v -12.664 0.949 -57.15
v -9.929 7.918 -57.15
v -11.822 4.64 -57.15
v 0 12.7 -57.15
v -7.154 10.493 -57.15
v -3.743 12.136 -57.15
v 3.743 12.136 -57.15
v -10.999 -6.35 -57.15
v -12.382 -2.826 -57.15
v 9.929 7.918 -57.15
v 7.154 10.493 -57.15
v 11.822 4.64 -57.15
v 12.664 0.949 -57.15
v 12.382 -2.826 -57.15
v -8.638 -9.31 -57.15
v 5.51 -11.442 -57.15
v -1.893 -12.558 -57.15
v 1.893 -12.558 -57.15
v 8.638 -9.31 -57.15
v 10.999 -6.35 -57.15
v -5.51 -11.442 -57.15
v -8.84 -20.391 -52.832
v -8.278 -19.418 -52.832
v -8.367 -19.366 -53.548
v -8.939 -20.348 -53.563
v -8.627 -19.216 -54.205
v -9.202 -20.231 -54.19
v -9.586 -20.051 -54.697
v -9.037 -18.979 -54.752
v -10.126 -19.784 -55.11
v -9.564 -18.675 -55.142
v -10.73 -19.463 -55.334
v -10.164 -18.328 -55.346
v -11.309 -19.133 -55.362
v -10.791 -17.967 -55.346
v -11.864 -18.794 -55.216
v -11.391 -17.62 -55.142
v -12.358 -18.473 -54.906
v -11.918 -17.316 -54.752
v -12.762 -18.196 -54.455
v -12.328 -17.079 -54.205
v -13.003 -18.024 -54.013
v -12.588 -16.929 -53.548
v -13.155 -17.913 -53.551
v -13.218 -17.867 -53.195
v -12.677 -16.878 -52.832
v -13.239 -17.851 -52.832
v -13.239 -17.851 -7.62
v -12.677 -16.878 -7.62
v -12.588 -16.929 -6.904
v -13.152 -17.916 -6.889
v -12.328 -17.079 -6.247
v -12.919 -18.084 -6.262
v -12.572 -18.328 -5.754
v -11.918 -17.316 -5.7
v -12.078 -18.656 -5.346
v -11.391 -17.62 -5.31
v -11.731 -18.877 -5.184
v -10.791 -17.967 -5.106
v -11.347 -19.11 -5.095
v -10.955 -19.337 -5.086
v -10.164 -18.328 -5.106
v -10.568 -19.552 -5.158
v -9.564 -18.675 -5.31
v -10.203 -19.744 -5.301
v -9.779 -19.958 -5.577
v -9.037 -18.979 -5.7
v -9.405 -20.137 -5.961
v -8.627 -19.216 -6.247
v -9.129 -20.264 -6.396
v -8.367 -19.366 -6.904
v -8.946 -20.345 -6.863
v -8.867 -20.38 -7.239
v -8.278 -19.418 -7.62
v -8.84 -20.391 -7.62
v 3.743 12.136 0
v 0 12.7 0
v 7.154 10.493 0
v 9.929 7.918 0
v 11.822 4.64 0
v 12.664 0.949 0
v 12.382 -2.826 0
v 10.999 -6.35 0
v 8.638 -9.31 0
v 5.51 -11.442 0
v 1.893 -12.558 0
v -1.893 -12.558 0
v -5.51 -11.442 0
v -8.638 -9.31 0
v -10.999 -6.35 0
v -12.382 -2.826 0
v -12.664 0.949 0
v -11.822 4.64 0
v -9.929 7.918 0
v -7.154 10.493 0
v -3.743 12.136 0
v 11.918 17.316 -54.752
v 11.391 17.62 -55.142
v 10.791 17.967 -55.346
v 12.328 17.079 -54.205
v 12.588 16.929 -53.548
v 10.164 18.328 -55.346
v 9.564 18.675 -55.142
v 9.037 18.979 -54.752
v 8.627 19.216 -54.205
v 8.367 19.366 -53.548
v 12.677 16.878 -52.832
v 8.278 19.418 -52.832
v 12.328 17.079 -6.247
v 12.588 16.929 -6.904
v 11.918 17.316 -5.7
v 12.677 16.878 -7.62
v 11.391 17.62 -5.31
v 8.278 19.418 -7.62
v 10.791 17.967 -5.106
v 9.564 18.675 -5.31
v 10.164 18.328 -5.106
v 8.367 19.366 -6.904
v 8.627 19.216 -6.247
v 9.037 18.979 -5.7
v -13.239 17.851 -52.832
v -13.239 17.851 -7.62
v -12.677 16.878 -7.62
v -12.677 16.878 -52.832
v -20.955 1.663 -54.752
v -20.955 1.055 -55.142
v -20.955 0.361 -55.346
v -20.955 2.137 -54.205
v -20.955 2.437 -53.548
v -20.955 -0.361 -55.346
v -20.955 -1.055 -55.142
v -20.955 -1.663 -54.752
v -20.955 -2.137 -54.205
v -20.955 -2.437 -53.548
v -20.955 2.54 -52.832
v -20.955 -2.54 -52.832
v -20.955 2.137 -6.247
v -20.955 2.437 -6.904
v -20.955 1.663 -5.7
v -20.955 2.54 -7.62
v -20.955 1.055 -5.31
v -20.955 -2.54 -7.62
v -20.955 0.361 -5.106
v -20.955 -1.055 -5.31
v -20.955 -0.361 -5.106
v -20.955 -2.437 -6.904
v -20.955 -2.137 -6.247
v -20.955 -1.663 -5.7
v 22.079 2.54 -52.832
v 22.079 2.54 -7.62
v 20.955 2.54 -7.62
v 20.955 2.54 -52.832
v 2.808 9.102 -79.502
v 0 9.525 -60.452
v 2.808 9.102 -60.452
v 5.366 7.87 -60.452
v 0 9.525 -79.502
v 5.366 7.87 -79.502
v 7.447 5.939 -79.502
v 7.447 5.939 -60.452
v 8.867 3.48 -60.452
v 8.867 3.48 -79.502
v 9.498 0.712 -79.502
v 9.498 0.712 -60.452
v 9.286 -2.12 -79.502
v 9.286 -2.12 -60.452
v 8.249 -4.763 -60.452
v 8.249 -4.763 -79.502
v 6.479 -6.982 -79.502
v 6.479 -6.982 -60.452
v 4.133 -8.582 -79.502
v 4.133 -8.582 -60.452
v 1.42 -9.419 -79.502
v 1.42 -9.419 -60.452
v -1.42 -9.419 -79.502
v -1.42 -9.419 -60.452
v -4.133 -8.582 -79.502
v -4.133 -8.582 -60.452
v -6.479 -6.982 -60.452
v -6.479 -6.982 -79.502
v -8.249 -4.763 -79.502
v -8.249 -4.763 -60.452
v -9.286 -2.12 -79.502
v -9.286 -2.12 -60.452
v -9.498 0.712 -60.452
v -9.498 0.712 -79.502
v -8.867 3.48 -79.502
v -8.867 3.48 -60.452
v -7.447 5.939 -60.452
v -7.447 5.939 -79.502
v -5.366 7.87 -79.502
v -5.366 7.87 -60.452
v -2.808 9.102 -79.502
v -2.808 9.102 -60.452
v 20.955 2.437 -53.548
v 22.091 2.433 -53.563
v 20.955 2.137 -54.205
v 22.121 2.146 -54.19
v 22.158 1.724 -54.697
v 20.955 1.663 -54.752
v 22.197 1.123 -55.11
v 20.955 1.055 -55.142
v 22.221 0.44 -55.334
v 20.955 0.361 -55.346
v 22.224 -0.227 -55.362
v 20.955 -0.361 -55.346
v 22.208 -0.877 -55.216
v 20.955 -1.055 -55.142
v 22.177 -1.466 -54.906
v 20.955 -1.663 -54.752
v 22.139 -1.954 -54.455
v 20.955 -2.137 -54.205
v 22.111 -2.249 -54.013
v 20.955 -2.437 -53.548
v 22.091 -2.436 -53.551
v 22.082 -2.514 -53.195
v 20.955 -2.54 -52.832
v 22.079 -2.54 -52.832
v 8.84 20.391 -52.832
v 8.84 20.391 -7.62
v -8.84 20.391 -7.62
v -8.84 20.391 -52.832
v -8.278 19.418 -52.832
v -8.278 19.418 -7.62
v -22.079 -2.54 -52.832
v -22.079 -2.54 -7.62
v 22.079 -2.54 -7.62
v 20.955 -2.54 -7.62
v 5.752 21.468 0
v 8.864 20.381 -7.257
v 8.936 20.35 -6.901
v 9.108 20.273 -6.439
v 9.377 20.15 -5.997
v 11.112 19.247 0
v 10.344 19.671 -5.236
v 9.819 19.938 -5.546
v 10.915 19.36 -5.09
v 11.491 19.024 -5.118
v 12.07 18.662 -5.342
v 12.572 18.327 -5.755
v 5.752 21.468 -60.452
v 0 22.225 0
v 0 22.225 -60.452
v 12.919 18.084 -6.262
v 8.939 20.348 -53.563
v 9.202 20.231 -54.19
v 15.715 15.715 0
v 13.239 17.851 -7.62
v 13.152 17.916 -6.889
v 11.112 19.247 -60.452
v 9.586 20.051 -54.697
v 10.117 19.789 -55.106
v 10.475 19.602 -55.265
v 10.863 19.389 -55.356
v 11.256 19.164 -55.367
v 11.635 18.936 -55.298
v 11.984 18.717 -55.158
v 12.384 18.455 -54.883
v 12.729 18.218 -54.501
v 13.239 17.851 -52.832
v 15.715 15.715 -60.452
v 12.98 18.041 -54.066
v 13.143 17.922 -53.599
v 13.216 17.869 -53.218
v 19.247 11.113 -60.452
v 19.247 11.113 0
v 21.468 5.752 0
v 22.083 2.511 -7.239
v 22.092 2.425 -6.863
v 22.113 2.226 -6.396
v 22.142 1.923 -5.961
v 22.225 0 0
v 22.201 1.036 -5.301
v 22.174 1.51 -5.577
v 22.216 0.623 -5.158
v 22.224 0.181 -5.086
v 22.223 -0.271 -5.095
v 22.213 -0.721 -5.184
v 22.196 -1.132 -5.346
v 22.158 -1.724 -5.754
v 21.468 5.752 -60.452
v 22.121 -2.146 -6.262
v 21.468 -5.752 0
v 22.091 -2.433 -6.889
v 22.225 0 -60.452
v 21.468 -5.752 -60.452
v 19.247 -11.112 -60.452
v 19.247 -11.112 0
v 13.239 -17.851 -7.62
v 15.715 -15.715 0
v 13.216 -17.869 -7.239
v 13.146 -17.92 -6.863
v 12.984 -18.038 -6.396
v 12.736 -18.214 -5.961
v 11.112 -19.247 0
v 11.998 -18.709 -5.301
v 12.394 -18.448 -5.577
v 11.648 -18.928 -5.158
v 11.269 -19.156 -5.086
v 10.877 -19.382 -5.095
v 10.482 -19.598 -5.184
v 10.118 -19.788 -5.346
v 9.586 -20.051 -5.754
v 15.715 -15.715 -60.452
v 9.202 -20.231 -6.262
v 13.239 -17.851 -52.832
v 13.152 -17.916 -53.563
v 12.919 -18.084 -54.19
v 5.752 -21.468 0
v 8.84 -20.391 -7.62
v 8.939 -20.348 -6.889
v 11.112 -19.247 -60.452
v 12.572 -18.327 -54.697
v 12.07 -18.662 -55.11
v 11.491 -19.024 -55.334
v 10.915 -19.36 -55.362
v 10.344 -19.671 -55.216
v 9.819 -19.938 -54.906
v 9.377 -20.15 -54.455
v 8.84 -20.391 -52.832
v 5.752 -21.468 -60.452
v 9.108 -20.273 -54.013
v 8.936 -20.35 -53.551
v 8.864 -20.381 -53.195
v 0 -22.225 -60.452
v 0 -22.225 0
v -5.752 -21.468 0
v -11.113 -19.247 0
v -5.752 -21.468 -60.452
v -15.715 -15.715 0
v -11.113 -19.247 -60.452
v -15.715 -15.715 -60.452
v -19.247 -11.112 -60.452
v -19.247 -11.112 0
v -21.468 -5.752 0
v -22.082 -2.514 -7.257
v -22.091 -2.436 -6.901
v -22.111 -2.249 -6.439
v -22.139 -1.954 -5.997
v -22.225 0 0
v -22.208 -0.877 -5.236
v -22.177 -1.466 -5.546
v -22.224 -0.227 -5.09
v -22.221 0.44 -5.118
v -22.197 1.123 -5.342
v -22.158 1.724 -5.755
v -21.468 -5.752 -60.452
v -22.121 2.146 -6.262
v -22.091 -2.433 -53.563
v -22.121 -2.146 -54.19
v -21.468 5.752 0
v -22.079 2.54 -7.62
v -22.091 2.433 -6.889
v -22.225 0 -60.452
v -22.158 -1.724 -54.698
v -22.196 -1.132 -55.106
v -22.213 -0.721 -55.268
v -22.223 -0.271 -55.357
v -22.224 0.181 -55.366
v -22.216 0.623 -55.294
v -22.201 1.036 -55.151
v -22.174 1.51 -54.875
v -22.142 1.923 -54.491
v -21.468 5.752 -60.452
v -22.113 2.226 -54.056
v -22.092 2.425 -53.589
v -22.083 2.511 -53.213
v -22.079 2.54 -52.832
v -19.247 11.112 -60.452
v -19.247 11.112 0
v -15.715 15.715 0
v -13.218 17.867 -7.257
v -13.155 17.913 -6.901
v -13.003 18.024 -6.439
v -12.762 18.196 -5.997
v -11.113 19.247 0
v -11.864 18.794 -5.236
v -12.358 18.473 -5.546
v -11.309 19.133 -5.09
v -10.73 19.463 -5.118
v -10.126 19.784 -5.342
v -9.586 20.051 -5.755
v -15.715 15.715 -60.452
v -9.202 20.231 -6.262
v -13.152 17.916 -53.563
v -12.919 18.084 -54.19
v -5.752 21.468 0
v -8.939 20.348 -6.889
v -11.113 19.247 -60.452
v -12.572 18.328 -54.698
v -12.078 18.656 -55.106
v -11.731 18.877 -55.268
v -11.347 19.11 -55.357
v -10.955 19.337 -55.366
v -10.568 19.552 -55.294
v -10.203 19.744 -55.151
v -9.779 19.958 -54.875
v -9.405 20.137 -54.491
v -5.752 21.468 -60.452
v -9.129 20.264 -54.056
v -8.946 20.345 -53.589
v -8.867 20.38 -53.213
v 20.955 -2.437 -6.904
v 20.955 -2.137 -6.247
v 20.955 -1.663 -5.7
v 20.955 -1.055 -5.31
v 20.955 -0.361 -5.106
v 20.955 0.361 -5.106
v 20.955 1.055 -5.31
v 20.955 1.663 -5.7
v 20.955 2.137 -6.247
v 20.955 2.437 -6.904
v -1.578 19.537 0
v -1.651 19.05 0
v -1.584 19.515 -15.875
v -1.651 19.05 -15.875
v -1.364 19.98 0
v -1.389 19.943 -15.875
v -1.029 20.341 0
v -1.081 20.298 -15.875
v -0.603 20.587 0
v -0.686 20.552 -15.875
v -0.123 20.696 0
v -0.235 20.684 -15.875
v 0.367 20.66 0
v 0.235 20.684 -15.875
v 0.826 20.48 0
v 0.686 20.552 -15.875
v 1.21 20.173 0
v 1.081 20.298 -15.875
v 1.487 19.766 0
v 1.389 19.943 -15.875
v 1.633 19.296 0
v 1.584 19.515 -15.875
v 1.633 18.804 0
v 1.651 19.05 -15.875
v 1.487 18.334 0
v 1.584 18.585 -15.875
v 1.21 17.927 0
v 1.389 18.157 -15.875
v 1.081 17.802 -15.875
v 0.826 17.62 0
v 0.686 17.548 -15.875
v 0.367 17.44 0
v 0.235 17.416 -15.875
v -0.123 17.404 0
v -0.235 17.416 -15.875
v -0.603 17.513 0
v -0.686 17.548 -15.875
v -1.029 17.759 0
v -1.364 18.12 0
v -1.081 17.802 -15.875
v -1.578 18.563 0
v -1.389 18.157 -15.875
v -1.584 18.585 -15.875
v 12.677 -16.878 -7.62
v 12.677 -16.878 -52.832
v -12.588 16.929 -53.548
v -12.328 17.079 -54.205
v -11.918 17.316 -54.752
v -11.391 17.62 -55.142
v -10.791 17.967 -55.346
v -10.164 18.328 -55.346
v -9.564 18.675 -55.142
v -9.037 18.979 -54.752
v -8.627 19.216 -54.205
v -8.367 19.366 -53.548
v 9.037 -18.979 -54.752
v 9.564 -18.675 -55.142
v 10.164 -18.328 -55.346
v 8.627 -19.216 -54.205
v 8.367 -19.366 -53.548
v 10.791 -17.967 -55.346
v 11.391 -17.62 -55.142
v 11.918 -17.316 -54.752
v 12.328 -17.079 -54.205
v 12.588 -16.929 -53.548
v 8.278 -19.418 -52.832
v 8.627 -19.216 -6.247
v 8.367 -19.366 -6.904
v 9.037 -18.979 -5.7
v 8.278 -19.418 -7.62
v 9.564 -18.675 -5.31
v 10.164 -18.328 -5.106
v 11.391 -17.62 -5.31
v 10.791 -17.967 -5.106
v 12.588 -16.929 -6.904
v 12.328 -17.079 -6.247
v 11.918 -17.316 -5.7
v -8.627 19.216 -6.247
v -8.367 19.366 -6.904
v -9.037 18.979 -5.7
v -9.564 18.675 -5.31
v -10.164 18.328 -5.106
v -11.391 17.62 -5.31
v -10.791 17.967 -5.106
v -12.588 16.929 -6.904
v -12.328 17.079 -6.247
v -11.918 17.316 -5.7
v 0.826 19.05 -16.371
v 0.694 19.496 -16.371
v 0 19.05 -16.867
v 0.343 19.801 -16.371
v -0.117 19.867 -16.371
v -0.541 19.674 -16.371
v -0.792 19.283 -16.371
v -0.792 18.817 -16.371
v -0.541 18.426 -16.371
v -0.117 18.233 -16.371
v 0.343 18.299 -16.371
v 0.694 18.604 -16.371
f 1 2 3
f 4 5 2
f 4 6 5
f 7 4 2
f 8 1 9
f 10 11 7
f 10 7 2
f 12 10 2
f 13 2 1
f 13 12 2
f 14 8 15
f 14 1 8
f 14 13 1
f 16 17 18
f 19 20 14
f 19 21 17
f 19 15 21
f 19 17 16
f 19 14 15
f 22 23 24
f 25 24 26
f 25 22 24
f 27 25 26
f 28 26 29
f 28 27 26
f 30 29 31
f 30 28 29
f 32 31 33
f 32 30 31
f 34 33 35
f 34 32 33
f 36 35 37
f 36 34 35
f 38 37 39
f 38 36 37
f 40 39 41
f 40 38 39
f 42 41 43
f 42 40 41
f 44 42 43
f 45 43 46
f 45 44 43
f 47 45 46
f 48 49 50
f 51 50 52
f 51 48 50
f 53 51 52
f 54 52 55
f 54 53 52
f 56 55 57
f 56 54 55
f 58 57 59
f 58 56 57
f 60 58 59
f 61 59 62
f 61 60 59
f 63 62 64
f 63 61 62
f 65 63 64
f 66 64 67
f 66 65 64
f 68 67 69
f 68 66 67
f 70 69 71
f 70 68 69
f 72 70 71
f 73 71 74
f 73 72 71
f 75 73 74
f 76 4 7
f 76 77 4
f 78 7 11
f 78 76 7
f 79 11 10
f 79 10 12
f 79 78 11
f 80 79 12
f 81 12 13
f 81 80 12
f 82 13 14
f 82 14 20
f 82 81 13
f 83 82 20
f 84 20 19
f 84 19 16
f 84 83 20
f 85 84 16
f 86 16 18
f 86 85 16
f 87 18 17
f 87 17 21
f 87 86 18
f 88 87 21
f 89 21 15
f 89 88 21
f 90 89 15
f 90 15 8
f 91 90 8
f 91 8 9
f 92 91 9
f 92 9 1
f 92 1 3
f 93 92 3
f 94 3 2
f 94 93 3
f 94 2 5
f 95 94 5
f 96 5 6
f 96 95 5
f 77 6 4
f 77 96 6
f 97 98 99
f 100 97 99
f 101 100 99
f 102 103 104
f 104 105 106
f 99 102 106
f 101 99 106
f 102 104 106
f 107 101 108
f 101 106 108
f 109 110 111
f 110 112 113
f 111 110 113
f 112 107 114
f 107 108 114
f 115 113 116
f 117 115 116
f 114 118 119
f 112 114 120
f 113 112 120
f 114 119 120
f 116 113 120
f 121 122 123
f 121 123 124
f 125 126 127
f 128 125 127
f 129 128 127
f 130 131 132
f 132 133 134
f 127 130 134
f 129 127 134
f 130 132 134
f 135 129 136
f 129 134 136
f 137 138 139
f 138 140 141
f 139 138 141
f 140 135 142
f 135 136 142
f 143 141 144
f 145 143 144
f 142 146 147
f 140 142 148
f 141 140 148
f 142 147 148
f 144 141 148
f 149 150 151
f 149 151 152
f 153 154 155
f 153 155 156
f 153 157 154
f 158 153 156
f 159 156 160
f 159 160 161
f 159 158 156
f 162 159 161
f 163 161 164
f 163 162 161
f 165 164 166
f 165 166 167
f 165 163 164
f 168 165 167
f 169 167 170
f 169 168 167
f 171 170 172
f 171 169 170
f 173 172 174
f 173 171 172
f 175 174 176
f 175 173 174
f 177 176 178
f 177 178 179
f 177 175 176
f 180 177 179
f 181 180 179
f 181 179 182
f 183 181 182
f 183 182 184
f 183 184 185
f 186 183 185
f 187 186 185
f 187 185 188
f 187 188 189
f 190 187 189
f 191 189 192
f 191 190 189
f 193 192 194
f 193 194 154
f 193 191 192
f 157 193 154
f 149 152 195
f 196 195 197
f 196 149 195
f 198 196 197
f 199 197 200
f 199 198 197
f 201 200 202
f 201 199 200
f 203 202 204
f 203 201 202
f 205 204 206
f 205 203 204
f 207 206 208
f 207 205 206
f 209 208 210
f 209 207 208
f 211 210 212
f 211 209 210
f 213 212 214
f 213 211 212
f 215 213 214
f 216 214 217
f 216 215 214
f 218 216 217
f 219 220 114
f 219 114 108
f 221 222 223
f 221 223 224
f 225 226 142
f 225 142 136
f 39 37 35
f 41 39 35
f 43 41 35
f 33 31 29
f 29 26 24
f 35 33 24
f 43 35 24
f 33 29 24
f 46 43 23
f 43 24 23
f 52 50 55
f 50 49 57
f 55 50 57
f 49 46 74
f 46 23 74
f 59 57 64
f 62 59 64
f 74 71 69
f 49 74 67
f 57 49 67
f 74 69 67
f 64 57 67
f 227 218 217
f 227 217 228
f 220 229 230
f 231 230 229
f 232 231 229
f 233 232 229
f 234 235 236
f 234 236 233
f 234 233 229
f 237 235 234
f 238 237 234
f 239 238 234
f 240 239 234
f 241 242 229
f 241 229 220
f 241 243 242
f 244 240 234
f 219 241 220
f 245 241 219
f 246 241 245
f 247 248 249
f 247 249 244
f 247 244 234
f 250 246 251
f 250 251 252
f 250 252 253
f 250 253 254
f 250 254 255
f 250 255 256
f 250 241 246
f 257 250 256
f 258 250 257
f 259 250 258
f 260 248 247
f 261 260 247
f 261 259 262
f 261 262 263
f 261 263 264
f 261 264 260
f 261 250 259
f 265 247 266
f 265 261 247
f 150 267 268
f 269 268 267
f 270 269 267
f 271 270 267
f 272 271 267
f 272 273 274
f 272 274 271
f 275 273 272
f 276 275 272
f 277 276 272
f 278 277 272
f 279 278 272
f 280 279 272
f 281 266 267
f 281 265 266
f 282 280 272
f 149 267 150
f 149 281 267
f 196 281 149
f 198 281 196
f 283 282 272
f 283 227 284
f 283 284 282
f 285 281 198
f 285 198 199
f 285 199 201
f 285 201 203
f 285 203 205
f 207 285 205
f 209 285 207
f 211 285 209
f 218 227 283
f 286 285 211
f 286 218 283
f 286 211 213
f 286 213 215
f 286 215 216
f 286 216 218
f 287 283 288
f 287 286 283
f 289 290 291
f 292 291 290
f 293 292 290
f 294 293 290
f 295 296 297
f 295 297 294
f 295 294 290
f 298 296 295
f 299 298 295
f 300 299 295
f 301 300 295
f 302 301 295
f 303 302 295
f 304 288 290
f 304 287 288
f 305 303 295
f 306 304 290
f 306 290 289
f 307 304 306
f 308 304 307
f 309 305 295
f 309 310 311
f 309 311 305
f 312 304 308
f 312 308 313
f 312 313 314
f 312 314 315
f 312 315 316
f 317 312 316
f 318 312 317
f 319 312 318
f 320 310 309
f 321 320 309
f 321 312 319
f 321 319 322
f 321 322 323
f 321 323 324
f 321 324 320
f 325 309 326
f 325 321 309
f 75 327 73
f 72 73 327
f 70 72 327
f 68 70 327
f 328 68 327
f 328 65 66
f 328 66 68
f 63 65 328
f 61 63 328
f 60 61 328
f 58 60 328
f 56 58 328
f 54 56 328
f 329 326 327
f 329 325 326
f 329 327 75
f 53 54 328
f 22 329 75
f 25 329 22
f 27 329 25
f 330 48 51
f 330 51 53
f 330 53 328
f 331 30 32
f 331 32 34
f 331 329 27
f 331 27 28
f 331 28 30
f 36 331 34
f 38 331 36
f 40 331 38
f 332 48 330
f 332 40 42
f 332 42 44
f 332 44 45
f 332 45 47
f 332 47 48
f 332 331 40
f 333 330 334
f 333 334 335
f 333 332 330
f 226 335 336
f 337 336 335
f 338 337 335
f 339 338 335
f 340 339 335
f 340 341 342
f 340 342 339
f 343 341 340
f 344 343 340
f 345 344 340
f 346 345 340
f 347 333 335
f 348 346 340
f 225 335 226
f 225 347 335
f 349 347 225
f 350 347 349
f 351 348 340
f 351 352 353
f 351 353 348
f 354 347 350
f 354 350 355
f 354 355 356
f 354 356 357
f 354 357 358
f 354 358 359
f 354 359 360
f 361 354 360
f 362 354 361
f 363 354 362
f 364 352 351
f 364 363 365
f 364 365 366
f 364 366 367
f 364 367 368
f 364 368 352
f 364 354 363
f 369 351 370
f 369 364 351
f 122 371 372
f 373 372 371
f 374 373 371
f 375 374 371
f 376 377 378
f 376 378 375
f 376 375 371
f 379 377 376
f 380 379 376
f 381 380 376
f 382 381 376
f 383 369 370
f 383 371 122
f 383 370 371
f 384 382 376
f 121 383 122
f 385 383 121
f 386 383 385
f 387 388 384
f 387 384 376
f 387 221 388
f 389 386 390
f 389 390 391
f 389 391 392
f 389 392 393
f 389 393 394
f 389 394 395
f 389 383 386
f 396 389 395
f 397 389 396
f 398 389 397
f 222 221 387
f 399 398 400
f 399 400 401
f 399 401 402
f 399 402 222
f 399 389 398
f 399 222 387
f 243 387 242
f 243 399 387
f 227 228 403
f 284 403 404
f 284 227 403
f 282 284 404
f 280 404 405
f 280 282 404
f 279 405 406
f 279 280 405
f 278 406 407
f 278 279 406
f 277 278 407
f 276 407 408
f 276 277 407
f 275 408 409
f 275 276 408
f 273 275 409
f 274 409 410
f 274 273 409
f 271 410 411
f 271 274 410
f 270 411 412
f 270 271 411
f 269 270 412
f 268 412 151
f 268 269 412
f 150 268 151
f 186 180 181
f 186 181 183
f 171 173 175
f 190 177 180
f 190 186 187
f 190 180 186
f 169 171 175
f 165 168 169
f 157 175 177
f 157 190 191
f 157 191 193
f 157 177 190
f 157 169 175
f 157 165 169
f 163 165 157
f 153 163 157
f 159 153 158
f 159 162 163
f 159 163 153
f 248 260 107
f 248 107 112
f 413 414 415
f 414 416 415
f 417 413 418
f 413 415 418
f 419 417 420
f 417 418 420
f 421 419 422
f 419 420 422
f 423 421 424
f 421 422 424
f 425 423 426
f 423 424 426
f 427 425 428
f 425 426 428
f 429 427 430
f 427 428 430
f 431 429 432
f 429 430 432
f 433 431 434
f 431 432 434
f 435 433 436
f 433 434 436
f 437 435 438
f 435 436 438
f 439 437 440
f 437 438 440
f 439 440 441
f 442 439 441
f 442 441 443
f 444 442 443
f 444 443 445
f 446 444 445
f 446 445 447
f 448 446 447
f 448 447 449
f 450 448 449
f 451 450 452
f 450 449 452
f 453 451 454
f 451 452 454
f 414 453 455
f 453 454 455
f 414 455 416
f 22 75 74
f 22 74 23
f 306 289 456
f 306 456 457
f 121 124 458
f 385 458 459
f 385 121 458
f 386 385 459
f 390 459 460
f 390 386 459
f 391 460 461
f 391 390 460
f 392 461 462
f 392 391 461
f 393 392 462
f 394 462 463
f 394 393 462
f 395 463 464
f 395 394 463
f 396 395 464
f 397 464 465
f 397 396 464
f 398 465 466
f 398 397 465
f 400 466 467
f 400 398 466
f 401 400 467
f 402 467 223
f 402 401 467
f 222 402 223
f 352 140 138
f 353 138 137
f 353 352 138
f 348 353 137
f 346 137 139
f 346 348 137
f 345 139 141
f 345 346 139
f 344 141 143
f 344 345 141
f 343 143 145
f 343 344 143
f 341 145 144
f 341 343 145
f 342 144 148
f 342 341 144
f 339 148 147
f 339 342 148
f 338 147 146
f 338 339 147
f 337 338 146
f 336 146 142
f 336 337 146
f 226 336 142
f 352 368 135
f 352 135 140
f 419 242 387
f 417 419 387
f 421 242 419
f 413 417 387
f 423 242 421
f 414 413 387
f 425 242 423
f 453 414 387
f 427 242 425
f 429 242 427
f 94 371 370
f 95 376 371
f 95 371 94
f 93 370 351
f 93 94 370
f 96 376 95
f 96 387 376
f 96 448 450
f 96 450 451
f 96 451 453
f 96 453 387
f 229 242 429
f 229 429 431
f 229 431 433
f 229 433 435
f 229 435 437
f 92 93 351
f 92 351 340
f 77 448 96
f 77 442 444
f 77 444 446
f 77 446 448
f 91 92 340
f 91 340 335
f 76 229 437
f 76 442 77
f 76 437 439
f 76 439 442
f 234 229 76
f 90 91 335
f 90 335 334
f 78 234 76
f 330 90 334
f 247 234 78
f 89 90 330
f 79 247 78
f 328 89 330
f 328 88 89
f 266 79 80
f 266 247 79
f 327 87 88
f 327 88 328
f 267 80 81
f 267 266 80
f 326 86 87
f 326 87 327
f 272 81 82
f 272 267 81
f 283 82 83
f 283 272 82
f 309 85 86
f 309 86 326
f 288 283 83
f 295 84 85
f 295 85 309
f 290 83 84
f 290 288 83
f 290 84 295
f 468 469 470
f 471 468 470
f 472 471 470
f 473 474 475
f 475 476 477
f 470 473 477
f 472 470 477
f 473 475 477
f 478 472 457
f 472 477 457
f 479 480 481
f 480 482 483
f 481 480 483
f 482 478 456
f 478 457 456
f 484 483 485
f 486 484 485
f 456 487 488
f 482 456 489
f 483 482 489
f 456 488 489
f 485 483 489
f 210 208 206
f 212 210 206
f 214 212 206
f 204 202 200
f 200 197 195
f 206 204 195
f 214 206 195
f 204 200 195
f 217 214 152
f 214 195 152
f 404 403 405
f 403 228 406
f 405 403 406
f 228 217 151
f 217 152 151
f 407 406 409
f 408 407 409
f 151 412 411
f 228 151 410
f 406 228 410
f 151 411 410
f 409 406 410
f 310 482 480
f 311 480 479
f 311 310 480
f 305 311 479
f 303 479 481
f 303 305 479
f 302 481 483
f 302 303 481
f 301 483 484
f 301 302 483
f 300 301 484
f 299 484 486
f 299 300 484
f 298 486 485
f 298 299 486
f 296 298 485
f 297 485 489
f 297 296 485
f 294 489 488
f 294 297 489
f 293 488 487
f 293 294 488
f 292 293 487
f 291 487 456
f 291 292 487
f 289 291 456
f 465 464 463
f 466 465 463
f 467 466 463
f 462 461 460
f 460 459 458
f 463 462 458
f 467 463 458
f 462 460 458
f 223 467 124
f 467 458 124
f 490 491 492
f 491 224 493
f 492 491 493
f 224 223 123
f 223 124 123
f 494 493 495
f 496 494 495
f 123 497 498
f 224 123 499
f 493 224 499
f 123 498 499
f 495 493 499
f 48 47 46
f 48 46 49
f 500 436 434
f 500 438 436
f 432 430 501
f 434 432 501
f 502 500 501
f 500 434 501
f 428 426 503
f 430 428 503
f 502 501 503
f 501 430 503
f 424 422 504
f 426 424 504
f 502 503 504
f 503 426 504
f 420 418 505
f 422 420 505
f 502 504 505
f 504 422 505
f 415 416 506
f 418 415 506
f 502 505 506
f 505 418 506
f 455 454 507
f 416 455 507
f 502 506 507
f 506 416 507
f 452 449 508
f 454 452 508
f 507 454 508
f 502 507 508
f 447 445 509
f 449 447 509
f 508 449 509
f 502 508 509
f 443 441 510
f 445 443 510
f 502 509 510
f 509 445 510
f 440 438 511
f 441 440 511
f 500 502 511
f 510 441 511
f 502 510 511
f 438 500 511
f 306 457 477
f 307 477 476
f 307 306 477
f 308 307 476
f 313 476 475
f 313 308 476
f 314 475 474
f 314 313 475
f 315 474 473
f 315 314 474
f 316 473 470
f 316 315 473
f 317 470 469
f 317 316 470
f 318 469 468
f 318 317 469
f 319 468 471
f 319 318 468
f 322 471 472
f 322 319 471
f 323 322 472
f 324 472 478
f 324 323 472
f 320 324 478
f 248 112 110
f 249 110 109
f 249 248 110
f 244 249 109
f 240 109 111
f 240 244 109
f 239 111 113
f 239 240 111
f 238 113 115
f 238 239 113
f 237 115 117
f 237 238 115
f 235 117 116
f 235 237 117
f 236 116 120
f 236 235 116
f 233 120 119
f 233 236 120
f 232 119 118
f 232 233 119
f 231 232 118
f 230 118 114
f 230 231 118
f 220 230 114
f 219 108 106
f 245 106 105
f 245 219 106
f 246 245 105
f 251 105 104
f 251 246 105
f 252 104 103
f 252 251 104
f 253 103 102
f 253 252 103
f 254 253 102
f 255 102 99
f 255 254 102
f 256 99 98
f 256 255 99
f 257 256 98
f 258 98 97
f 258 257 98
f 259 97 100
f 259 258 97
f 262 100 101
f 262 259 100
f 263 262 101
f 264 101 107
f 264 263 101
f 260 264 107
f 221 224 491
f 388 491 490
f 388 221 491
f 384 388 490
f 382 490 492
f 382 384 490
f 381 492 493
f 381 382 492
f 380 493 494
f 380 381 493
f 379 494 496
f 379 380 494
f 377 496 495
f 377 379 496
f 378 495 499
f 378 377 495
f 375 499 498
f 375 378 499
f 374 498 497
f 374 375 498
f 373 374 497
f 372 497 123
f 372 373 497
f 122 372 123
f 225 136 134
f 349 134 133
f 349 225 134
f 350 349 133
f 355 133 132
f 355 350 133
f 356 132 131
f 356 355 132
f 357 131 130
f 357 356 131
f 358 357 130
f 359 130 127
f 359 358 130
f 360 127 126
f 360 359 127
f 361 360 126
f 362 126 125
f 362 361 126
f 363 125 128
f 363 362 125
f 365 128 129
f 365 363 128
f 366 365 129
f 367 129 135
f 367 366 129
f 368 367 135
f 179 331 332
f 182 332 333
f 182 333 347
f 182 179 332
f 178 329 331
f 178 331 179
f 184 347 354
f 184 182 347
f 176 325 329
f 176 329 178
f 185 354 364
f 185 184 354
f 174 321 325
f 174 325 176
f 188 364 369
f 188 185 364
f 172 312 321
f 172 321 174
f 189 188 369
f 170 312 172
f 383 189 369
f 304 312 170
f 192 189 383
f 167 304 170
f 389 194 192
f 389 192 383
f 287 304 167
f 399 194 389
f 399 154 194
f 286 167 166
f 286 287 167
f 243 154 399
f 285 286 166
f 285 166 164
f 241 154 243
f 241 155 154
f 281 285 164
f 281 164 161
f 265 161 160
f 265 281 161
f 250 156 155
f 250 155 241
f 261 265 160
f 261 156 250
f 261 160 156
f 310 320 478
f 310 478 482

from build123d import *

# Parameters (mm, degrees)
CUT_EXTRUDE1_DEPTH              = 1.27
CIRPATTERN1_COUNT               = 6
F_3_4_0_13_DIAMETER_HOLE1_D     = 3.302
F_3_4_0_13_DIAMETER_HOLE1_DEPTH = 15.875
F_3_4_0_13_DIAMETER_HOLE1_TIP   = 0.992020882


with BuildPart() as part:
    # Sketch1 → Revolve1 (revolve)
    with BuildSketch(Plane(origin=(0, 0, 0), x_dir=(0, 0, -1), z_dir=(1, 0, 0))):
        Polygon((0, 12.7), (0, 22.225), (60.452, 22.225), (60.452, 9.525), (79.502, 9.525), (79.502, 0), (57.15, 0), (57.15, 12.7), align=None)
    revolve(axis=Axis((0, 0, 0), (0, 0, -1)))

    # Sketch2 → Cut-Extrude1 (cut)
    with BuildSketch(Plane(origin=(22.225, 0, 0), x_dir=(0, 0, -1), z_dir=(1, 0, 0))):
        with BuildLine():
            Line((7.62, 2.54), (52.832, 2.54))
            ThreePointArc((52.832, 2.54), (55.372, 0), (52.832, -2.54))
            Line((52.832, -2.54), (7.62, -2.54))
            ThreePointArc((7.62, -2.54), (5.08, 0), (7.62, 2.54))
        make_face()
    cut_extrude1 = extrude(amount=-CUT_EXTRUDE1_DEPTH, mode=Mode.SUBTRACT)

    # CirPattern1: Cut-Extrude1 ×6 about axis
    cirpattern1_axis = Axis((0, 0, 0), (0, 0, 1))
    for i in range(1, CIRPATTERN1_COUNT):
        add(cut_extrude1.rotate(cirpattern1_axis, i * 360 / CIRPATTERN1_COUNT), mode=Mode.SUBTRACT)

    # 3/4 (0.13) Diameter Hole1
    with Locations(Plane.XY):
        with Locations((0, 19.05)):
            Hole(F_3_4_0_13_DIAMETER_HOLE1_D / 2, depth=F_3_4_0_13_DIAMETER_HOLE1_DEPTH)
            with Locations((0, 0, -(F_3_4_0_13_DIAMETER_HOLE1_DEPTH + F_3_4_0_13_DIAMETER_HOLE1_TIP / 2))):  # 118° drill point
                Cone(0, F_3_4_0_13_DIAMETER_HOLE1_D / 2, F_3_4_0_13_DIAMETER_HOLE1_TIP, mode=Mode.SUBTRACT)


solid = part.part
